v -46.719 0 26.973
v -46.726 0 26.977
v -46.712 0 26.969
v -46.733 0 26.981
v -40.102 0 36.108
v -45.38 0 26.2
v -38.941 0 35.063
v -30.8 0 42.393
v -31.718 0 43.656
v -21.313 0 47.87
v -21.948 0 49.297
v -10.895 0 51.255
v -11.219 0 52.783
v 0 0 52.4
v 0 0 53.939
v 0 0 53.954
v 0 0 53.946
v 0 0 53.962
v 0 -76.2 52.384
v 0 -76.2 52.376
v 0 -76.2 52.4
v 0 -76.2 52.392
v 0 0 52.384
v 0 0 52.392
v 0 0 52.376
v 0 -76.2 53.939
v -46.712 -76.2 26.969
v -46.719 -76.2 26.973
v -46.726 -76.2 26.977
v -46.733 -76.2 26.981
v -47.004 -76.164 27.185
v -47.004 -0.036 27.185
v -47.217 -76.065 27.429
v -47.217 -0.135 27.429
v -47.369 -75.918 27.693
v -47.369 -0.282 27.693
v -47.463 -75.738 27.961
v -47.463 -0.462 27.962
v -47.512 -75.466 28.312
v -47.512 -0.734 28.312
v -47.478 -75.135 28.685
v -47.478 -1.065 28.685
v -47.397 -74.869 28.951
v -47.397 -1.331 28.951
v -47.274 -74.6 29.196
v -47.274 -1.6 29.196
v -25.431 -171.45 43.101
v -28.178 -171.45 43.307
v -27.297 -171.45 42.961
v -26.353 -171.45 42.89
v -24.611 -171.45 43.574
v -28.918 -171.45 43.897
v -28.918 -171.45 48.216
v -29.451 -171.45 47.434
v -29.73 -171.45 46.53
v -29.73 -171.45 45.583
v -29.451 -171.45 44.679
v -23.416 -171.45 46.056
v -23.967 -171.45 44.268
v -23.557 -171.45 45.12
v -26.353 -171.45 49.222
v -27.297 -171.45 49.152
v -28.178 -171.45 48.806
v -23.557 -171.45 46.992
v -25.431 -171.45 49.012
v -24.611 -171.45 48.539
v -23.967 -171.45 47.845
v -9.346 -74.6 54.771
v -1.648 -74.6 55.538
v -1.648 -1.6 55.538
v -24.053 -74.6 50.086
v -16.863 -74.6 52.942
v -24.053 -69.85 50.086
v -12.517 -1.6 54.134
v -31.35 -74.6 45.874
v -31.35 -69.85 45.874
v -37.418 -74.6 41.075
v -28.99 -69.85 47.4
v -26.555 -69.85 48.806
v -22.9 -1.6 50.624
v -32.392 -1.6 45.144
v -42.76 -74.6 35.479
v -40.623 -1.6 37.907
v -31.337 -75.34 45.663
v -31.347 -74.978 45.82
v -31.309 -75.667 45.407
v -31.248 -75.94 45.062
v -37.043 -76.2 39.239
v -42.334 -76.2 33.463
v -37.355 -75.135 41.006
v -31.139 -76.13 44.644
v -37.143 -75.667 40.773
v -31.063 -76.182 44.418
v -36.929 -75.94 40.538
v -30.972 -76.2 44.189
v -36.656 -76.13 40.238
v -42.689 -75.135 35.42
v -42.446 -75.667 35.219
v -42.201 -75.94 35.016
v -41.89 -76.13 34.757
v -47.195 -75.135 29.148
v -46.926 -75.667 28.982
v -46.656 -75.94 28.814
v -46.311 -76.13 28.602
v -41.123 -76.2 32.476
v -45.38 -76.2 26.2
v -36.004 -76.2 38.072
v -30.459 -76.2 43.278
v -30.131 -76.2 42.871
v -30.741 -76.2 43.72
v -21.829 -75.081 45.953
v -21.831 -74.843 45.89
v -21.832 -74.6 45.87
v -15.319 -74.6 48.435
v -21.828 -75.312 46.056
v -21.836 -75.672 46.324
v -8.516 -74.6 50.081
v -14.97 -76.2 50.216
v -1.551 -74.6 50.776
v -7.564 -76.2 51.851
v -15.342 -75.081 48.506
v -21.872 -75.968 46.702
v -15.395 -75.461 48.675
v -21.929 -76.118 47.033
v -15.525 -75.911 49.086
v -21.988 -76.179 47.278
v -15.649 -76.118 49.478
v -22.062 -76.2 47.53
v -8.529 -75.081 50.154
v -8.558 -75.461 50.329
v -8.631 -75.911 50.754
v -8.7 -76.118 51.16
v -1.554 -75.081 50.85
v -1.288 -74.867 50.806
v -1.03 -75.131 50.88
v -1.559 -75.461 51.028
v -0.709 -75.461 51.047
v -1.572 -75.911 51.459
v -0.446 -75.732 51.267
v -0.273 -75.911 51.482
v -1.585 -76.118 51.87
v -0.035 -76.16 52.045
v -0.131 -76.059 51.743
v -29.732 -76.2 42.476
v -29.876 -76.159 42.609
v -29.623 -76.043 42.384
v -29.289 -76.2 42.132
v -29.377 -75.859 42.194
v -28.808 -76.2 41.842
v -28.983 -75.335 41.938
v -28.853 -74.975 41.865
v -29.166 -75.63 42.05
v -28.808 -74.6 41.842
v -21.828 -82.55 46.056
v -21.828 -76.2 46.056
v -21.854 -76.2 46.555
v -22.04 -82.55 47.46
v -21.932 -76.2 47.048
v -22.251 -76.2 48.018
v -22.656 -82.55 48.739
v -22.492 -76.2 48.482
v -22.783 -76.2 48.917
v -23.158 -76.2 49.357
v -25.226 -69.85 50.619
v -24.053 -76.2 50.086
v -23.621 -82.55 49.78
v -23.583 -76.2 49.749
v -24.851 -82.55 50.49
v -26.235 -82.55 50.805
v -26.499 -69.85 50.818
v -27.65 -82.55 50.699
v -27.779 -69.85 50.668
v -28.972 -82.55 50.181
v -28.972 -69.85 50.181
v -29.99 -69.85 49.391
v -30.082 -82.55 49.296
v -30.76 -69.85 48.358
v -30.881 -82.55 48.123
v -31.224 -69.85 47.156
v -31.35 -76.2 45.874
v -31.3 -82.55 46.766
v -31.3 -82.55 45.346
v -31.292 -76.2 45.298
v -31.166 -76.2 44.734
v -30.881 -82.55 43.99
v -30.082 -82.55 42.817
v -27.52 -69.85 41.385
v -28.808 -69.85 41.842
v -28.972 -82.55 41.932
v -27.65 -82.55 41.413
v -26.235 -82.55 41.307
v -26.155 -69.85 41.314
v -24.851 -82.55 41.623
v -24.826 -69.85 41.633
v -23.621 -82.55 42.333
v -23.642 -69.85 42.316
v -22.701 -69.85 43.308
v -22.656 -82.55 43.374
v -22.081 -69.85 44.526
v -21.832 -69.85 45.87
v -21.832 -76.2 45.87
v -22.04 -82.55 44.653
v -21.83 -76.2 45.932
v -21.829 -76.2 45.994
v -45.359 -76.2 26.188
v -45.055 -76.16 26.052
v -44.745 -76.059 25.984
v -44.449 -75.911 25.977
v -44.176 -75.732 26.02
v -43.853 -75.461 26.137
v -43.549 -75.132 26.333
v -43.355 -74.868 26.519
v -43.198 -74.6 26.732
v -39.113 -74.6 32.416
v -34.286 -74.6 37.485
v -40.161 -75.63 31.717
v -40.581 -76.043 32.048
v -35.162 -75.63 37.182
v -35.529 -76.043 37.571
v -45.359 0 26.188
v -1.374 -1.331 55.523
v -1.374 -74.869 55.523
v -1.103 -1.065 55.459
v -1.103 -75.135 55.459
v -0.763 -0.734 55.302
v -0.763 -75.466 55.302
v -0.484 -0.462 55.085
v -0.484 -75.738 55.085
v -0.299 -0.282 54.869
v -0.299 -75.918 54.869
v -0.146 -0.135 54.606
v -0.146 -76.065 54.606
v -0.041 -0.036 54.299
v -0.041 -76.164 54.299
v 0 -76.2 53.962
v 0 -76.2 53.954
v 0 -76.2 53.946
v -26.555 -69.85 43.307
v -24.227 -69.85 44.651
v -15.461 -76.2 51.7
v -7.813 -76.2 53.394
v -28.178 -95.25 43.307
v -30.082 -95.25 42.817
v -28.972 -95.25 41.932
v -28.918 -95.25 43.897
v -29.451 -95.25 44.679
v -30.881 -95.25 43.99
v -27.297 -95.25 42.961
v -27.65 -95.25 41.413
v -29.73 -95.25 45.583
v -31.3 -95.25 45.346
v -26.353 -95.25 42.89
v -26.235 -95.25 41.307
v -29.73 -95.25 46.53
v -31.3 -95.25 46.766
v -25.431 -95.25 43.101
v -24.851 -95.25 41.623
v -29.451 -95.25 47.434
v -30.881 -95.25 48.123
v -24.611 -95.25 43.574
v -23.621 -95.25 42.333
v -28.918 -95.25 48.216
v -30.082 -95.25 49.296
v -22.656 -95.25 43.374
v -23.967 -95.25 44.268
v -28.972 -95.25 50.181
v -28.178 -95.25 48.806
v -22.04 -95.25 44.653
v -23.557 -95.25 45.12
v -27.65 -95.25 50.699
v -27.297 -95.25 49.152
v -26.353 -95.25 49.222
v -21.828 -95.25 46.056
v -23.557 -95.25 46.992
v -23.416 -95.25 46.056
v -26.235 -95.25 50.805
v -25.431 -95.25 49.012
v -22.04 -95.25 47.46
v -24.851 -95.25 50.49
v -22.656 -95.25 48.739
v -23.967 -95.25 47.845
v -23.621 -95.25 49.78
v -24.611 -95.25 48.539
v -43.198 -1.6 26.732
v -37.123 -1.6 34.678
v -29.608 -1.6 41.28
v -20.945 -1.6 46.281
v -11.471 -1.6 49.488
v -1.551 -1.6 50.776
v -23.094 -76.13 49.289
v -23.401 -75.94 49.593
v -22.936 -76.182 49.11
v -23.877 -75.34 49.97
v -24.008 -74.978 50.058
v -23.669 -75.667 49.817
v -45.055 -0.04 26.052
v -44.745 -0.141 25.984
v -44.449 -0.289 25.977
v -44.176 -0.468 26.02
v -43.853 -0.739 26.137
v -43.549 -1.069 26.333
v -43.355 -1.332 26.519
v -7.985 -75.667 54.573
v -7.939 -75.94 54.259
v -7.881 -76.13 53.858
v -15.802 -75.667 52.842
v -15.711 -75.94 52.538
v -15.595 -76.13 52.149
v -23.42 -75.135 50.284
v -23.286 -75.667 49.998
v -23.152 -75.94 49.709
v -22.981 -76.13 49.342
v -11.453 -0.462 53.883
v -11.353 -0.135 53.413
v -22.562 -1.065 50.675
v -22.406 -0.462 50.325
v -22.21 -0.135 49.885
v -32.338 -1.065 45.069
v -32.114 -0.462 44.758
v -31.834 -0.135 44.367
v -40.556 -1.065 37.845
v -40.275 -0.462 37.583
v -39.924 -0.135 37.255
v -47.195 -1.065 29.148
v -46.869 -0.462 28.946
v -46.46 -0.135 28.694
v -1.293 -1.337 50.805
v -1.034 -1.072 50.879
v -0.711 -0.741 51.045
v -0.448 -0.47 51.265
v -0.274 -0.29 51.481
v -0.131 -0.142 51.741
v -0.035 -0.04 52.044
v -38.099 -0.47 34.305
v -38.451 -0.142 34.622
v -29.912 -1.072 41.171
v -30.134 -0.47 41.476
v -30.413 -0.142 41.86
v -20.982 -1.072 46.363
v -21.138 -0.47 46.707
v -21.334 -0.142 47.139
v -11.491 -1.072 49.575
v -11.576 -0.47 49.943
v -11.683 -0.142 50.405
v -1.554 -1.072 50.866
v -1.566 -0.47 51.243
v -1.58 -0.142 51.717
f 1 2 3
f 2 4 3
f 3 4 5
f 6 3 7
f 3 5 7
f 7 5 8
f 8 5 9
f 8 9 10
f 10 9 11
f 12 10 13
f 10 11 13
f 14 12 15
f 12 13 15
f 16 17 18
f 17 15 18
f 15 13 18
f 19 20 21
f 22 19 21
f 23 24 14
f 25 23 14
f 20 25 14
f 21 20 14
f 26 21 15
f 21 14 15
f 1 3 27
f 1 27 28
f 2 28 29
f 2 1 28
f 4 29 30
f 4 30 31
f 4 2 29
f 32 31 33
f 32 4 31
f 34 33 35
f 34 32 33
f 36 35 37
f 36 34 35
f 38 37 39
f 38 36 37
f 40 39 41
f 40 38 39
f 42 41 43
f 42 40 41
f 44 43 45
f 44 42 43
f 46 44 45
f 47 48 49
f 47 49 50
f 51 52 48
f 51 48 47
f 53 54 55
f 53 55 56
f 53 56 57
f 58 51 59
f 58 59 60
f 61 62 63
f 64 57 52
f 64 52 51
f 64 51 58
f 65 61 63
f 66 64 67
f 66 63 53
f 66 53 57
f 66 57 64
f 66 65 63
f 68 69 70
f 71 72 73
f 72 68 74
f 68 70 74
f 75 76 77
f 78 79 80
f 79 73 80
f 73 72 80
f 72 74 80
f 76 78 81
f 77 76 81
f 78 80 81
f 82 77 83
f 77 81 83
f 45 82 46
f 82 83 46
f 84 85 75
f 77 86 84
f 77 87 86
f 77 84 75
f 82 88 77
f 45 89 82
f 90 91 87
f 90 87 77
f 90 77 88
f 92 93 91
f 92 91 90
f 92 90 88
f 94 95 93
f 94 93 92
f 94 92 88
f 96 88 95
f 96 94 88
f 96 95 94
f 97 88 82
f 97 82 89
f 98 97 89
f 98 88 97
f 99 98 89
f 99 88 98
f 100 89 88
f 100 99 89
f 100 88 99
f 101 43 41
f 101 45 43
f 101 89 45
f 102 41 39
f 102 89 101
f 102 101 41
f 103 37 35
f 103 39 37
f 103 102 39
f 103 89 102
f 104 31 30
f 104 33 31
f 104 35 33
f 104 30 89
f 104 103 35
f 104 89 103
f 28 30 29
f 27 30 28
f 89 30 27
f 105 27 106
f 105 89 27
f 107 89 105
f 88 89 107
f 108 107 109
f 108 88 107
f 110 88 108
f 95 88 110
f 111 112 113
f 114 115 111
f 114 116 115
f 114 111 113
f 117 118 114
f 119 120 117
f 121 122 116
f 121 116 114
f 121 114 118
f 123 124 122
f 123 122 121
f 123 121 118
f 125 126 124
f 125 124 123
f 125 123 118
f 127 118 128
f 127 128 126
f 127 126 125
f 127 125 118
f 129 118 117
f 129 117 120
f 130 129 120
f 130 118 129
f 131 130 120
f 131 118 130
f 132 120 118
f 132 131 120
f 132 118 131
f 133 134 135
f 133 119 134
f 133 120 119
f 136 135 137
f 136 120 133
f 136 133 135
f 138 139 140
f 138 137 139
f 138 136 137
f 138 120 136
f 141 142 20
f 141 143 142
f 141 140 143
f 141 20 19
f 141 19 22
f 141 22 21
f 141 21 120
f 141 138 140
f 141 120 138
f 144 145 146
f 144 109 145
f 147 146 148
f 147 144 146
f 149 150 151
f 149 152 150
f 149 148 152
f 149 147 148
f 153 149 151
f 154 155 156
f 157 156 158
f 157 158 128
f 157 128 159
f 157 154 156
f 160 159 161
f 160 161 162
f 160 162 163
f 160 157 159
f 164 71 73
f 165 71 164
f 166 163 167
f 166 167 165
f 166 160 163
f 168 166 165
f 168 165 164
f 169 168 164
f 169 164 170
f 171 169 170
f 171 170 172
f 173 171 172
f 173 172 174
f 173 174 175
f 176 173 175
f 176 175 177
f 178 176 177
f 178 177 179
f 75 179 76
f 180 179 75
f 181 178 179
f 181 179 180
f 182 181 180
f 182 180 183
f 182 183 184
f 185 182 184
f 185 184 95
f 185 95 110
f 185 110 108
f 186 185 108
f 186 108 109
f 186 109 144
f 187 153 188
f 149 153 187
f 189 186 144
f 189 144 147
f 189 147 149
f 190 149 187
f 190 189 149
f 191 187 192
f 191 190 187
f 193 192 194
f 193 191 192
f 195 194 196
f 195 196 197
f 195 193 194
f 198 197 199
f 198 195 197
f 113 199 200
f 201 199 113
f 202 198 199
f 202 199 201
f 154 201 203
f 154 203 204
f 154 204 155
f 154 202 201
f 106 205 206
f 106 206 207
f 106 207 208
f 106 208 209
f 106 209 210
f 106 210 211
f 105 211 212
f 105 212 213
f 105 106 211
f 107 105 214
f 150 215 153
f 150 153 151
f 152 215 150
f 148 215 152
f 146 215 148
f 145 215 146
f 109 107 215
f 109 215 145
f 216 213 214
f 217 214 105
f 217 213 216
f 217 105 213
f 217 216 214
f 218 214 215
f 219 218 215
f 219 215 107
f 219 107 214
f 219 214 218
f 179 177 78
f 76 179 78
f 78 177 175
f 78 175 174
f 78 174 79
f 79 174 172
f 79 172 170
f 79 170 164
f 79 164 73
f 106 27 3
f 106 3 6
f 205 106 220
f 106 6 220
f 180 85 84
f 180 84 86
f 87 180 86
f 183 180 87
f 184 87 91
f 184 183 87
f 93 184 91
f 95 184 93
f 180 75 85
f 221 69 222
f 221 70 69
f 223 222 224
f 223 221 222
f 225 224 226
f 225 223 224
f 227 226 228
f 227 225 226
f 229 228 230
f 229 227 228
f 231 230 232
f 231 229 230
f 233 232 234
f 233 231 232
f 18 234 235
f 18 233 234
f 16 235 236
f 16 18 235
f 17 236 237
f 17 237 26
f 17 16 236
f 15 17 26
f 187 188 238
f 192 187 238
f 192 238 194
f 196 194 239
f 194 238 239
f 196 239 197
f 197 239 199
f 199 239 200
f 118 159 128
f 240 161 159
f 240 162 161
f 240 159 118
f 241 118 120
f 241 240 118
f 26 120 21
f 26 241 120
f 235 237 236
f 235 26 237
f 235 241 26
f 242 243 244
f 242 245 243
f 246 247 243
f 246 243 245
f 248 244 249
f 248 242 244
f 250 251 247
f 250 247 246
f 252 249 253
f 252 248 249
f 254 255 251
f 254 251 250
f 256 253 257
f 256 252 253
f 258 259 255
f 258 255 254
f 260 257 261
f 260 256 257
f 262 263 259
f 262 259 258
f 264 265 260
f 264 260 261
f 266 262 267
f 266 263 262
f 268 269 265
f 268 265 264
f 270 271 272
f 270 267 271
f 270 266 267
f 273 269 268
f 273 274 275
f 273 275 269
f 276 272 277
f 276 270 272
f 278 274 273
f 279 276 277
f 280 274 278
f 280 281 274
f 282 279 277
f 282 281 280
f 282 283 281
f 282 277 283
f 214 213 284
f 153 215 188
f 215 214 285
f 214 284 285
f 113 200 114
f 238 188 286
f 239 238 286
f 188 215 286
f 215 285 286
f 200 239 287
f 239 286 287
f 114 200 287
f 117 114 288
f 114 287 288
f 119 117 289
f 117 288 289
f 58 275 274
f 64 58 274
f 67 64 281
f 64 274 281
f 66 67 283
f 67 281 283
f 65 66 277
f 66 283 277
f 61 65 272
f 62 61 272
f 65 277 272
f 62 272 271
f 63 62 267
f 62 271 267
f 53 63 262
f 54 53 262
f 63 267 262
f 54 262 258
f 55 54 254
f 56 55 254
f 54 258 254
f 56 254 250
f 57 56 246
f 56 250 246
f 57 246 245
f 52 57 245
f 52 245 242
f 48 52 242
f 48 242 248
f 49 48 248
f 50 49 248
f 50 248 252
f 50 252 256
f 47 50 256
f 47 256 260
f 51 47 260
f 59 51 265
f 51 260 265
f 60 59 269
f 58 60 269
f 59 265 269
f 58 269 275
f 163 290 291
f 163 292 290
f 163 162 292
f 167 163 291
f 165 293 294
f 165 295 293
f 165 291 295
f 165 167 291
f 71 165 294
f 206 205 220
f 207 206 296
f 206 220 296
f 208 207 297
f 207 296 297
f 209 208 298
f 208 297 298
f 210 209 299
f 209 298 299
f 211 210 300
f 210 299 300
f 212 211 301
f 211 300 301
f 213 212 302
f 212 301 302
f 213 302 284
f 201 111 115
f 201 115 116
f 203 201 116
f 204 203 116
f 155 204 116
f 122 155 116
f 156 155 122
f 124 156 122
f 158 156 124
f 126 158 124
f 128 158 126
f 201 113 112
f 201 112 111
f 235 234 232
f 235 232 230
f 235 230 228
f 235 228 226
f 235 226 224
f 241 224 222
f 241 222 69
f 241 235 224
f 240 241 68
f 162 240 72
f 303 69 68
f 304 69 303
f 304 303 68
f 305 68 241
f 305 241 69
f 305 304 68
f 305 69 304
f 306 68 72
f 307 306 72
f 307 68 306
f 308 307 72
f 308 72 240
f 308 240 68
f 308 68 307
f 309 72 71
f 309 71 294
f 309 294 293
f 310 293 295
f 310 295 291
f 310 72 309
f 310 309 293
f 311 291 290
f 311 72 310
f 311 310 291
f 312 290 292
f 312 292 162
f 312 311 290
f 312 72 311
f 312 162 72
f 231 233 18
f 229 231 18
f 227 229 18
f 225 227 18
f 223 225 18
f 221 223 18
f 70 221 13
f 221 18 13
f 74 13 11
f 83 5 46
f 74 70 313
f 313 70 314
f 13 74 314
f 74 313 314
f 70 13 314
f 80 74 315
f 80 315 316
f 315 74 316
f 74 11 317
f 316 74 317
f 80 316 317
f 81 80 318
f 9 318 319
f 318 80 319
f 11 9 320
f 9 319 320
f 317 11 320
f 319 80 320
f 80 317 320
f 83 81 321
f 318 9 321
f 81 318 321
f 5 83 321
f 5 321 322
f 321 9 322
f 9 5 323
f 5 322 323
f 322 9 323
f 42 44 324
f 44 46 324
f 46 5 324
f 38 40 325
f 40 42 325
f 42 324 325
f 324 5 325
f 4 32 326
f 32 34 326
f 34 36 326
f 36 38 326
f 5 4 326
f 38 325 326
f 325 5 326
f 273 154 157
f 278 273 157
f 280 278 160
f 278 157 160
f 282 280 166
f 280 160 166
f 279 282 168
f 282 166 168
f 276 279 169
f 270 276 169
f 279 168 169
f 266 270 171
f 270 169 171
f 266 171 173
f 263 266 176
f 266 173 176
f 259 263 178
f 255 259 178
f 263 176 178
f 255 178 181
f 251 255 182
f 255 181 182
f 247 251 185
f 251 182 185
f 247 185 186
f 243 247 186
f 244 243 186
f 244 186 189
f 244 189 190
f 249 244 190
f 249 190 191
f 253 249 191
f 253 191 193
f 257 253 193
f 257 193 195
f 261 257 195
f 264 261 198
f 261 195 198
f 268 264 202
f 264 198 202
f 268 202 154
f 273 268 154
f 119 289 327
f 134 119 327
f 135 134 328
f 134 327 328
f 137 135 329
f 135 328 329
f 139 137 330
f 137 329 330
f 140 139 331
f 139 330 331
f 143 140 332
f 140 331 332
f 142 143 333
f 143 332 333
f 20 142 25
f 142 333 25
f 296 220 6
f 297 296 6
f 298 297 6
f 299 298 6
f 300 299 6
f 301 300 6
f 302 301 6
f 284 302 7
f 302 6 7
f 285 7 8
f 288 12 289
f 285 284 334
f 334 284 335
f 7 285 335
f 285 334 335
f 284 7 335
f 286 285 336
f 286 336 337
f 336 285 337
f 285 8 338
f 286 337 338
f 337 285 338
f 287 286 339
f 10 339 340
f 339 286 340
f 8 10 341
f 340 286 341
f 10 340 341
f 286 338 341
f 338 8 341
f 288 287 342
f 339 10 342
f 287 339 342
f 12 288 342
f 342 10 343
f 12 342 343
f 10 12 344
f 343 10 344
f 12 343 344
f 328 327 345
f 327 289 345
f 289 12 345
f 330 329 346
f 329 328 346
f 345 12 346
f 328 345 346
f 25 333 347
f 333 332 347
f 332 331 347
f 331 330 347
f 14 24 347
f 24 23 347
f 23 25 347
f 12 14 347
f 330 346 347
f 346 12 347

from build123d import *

# Parameters (mm, degrees)
F1_DEPTH     = 76.2
F2_R         = 4.7625
F3_DEPTH     = 6.35
F4_R         = 4.7625
F5_DEPTH     = 12.7
F6_R         = 3.175
F7_DEPTH     = 76.2
F8_T1_DEPTH  = 84.4391678442
F8_T3_DEPTH  = 84.0788040297
F8_T8_ANGLE  = 33.9025331494
F8_S9_R      = 4.7625
F8_T10_DEPTH = 21
F8_T14_ANGLE = 34.4766821812
F8_S15_R     = 4.7625
F8_T16_DEPTH = 21
F8_T20_ANGLE = 33.9025331494
F8_S21_R     = 4.7625
F8_T22_DEPTH = 20
F8_T26_ANGLE = 34.4766821812
F8_S27_R     = 4.7625
F8_T28_DEPTH = 20
F8_T30_ANGLE = 68.2520650555
F8_T32_ANGLE = 69.0256961544


# Not quite as in the source:
# - a fillet or chamfer that OpenCascade refuses, or shapes differently, is made with other operations: its cross-section is extruded or revolved along the edge and cut away or added


with BuildPart() as f1:
    # F0 (on Front) → F1 (new body)
    with BuildSketch(Plane.XZ):
        with BuildLine():
            Line((0, 50.8), (0, 55.5625))
            ThreePointArc((0, 55.5625), (-27.78125, 48.1185364978), (-48.1185364978, 27.78125))
            Line((-48.1185364978, 27.78125), (-43.9940905122, 25.4))
            ThreePointArc((-43.9940905122, 25.4), (-25.4, 43.9940905122), (0, 50.8))
        make_face()
    extrude(amount=F1_DEPTH)

    # F2 (on face) → F3 (join, symmetric)
    with BuildSketch(Plane.XZ.offset(76.2)):
        with Locations((-26.590625, 46.056313505)):
            Circle(F2_R)
    extrude(amount=F3_DEPTH, both=True)

    # F4 (on face) → F5 (join)
    with BuildSketch(Plane.XZ.offset(82.55)):
        with Locations((-26.590625, 46.056313505)):
            Circle(F4_R)
    extrude(amount=F5_DEPTH)

    # F6 (on face) → F7 (join)
    with BuildSketch(Plane.XZ.offset(95.25)):
        with Locations((-26.590625, 46.056313505)):
            Circle(F6_R)
    extrude(amount=F7_DEPTH)

    # F8: fillet of radius 1.6002 on 10 edges, made by hand

    # F8_s2 → F8_t1 (cut)
    with BuildSketch(Plane.XZ.offset(-4.1195839221)):
        with BuildLine():
            ThreePointArc((-46.7121706404, 26.9692842937), (-47.4637166662, 27.9639017102), (-47.2735488472, 29.1959412529))
            ThreePointArc((-47.2735488472, 29.1959412529), (-47.7012874507, 28.4917283049), (-48.1185364978, 27.78125))
            Line((-48.1185364978, 27.78125), (-46.7121706404, 26.9692842937))
        make_face()
        with BuildLine():
            ThreePointArc((-1.6476523888, 55.5380648552), (-0.4855909368, 55.0867352461), (0, 53.9385685873))
            Line((0, 53.9385685873), (0, 55.5625))
            ThreePointArc((0, 55.5625), (-0.8239167844, 55.5563908779), (-1.6476523888, 55.5380648552))
        make_face()
    extrude(amount=F8_T1_DEPTH, mode=Mode.SUBTRACT)

    # F8_s4 → F8_t3 (cut)
    with BuildSketch(Plane.XZ.offset(-3.9394020148)):
        with BuildLine():
            ThreePointArc((-45.3587394005, 26.187880403), (-44.1681291542, 26.0218753898), (-43.197905381, 26.7316473622))
            ThreePointArc((-43.197905381, 26.7316473622), (-43.6010820753, 26.0688634556), (-43.9940905122, 25.4))
            Line((-43.9940905122, 25.4), (-45.3587394005, 26.187880403))
        make_face()
        with BuildLine():
            ThreePointArc((-1.5513330102, 50.7763071313), (-0.4515405646, 51.2616595801), (0, 52.3757608059))
            Line((0, 52.3757608059), (0, 50.8))
            ThreePointArc((0, 50.8), (-0.7757569627, 50.7940764375), (-1.5513330102, 50.7763071313))
        make_face()
    extrude(amount=F8_T3_DEPTH, mode=Mode.SUBTRACT)


with BuildPart() as f8_tool6:
    # F8_s7 → F8_t8 (revolve)
    with BuildSketch(Plane(origin=(0, 0, 0), x_dir=(0, 1, 0), z_dir=(0.8640737071, 0, 0.5033653034))):
        with BuildLine():
            ThreePointArc((-74.5998, 55.5625), (-75.7313122713, 55.0938122713), (-76.2, 53.9623))
            Line((-76.2, 53.9623), (-76.2, 55.5625))
            Line((-76.2, 55.5625), (-74.5998, 55.5625))
        make_face()
    revolve(axis=Axis((0, -76.2, 0), (0, -1, 0)), revolution_arc=F8_T8_ANGLE)

    # F8_s9 → F8_t10 (cut, symmetric)
    with BuildSketch(Plane.XZ.offset(75.4)):
        with Locations((-26.590625, 46.056313505)):
            Circle(F8_S9_R)
    extrude(amount=F8_T10_DEPTH, both=True, mode=Mode.SUBTRACT)


with BuildPart() as f1_1:
    add(f1.part)

    # F8_t5: cut F8_tool6
    add(f8_tool6.part, mode=Mode.SUBTRACT)


with BuildPart() as f8_tool12:
    # F8_s13 → F8_t14 (revolve)
    with BuildSketch(Plane(origin=(0, 0, 0), x_dir=(0, 1, 0), z_dir=(-0.4303190954, 0, -0.9026768393))):
        with BuildLine():
            ThreePointArc((-74.5998, -50.8), (-75.7313122713, -51.2686877287), (-76.2, -52.4002))
            Line((-76.2, -52.4002), (-76.2, -50.8))
            Line((-76.2, -50.8), (-74.5998, -50.8))
        make_face()
    revolve(axis=Axis((0, -76.2, 0), (0, 1, 0)), revolution_arc=F8_T14_ANGLE)

    # F8_s15 → F8_t16 (cut, symmetric)
    with BuildSketch(Plane.XZ.offset(74.8)):
        with Locations((-26.590625, 46.056313505)):
            Circle(F8_S15_R)
    extrude(amount=F8_T16_DEPTH, both=True, mode=Mode.SUBTRACT)


with BuildPart() as f1_2:
    add(f1_1.part)

    # F8_t11: cut F8_tool12
    add(f8_tool12.part, mode=Mode.SUBTRACT)


with BuildPart() as f8_tool18:
    # F8_s19 → F8_t20 (revolve)
    with BuildSketch(Plane(origin=(0, 0, 0), x_dir=(0, 1, 0), z_dir=(0.9974089506, 0, -0.071940151))):
        with BuildLine():
            ThreePointArc((-74.5998, 55.5625), (-75.7313122713, 55.0938122713), (-76.2, 53.9623))
            Line((-76.2, 53.9623), (-76.2, 55.5625))
            Line((-76.2, 55.5625), (-74.5998, 55.5625))
        make_face()
    revolve(axis=Axis((0, -76.2, 0), (0, -1, 0)), revolution_arc=F8_T20_ANGLE)

    # F8_s21 → F8_t22 (cut, symmetric)
    with BuildSketch(Plane.XZ.offset(75.4)):
        with Locations((-26.590625, 46.056313505)):
            Circle(F8_S21_R)
    extrude(amount=F8_T22_DEPTH, both=True, mode=Mode.SUBTRACT)


with BuildPart() as f1_3:
    add(f1_2.part)

    # F8_t17: cut F8_tool18
    add(f8_tool18.part, mode=Mode.SUBTRACT)


with BuildPart() as f8_tool24:
    # F8_s25 → F8_t26 (revolve)
    with BuildSketch(Plane(origin=(0, 0, 0), x_dir=(0, 1, 0), z_dir=(-0.8663350804, 0, -0.4994632404))):
        with BuildLine():
            ThreePointArc((-74.5998, -50.8), (-75.7313122713, -51.2686877287), (-76.2, -52.4002))
            Line((-76.2, -52.4002), (-76.2, -50.8))
            Line((-76.2, -50.8), (-74.5998, -50.8))
        make_face()
    revolve(axis=Axis((0, -76.2, 0), (0, 1, 0)), revolution_arc=F8_T26_ANGLE)

    # F8_s27 → F8_t28 (cut, symmetric)
    with BuildSketch(Plane.XZ.offset(74.8)):
        with Locations((-26.590625, 46.056313505)):
            Circle(F8_S27_R)
    extrude(amount=F8_T28_DEPTH, both=True, mode=Mode.SUBTRACT)


with BuildPart() as f1_4:
    add(f1_3.part)

    # F8_t23: cut F8_tool24
    add(f8_tool24.part, mode=Mode.SUBTRACT)

    # F8_s29 → F8_t30 (revolve, cut)
    with BuildSketch(Plane(origin=(0, 0, 0), x_dir=(0, 1, 0), z_dir=(0.9974081949, 0, -0.0719506275))):
        with BuildLine():
            ThreePointArc((-1.6002, 55.5625), (-0.4686877287, 55.0938122713), (0, 53.9623))
            Line((0, 53.9623), (0, 55.5625))
            Line((0, 55.5625), (-1.6002, 55.5625))
        make_face()
    revolve(axis=Axis((0, 0, 0), (0, -1, 0)), revolution_arc=F8_T30_ANGLE, mode=Mode.SUBTRACT)

    # F8_s31 → F8_t32 (revolve, cut)
    with BuildSketch(Plane(origin=(0, 0, 0), x_dir=(0, 1, 0), z_dir=(-0.4303086891, 0, -0.9026818))):
        with BuildLine():
            ThreePointArc((-1.6002, -50.8), (-0.4686877287, -51.2686877287), (0, -52.4002))
            Line((0, -52.4002), (0, -50.8))
            Line((0, -50.8), (-1.6002, -50.8))
        make_face()
    revolve(axis=Axis((0, 0, 0), (0, 1, 0)), revolution_arc=F8_T32_ANGLE, mode=Mode.SUBTRACT)


solid = f1_4.part
